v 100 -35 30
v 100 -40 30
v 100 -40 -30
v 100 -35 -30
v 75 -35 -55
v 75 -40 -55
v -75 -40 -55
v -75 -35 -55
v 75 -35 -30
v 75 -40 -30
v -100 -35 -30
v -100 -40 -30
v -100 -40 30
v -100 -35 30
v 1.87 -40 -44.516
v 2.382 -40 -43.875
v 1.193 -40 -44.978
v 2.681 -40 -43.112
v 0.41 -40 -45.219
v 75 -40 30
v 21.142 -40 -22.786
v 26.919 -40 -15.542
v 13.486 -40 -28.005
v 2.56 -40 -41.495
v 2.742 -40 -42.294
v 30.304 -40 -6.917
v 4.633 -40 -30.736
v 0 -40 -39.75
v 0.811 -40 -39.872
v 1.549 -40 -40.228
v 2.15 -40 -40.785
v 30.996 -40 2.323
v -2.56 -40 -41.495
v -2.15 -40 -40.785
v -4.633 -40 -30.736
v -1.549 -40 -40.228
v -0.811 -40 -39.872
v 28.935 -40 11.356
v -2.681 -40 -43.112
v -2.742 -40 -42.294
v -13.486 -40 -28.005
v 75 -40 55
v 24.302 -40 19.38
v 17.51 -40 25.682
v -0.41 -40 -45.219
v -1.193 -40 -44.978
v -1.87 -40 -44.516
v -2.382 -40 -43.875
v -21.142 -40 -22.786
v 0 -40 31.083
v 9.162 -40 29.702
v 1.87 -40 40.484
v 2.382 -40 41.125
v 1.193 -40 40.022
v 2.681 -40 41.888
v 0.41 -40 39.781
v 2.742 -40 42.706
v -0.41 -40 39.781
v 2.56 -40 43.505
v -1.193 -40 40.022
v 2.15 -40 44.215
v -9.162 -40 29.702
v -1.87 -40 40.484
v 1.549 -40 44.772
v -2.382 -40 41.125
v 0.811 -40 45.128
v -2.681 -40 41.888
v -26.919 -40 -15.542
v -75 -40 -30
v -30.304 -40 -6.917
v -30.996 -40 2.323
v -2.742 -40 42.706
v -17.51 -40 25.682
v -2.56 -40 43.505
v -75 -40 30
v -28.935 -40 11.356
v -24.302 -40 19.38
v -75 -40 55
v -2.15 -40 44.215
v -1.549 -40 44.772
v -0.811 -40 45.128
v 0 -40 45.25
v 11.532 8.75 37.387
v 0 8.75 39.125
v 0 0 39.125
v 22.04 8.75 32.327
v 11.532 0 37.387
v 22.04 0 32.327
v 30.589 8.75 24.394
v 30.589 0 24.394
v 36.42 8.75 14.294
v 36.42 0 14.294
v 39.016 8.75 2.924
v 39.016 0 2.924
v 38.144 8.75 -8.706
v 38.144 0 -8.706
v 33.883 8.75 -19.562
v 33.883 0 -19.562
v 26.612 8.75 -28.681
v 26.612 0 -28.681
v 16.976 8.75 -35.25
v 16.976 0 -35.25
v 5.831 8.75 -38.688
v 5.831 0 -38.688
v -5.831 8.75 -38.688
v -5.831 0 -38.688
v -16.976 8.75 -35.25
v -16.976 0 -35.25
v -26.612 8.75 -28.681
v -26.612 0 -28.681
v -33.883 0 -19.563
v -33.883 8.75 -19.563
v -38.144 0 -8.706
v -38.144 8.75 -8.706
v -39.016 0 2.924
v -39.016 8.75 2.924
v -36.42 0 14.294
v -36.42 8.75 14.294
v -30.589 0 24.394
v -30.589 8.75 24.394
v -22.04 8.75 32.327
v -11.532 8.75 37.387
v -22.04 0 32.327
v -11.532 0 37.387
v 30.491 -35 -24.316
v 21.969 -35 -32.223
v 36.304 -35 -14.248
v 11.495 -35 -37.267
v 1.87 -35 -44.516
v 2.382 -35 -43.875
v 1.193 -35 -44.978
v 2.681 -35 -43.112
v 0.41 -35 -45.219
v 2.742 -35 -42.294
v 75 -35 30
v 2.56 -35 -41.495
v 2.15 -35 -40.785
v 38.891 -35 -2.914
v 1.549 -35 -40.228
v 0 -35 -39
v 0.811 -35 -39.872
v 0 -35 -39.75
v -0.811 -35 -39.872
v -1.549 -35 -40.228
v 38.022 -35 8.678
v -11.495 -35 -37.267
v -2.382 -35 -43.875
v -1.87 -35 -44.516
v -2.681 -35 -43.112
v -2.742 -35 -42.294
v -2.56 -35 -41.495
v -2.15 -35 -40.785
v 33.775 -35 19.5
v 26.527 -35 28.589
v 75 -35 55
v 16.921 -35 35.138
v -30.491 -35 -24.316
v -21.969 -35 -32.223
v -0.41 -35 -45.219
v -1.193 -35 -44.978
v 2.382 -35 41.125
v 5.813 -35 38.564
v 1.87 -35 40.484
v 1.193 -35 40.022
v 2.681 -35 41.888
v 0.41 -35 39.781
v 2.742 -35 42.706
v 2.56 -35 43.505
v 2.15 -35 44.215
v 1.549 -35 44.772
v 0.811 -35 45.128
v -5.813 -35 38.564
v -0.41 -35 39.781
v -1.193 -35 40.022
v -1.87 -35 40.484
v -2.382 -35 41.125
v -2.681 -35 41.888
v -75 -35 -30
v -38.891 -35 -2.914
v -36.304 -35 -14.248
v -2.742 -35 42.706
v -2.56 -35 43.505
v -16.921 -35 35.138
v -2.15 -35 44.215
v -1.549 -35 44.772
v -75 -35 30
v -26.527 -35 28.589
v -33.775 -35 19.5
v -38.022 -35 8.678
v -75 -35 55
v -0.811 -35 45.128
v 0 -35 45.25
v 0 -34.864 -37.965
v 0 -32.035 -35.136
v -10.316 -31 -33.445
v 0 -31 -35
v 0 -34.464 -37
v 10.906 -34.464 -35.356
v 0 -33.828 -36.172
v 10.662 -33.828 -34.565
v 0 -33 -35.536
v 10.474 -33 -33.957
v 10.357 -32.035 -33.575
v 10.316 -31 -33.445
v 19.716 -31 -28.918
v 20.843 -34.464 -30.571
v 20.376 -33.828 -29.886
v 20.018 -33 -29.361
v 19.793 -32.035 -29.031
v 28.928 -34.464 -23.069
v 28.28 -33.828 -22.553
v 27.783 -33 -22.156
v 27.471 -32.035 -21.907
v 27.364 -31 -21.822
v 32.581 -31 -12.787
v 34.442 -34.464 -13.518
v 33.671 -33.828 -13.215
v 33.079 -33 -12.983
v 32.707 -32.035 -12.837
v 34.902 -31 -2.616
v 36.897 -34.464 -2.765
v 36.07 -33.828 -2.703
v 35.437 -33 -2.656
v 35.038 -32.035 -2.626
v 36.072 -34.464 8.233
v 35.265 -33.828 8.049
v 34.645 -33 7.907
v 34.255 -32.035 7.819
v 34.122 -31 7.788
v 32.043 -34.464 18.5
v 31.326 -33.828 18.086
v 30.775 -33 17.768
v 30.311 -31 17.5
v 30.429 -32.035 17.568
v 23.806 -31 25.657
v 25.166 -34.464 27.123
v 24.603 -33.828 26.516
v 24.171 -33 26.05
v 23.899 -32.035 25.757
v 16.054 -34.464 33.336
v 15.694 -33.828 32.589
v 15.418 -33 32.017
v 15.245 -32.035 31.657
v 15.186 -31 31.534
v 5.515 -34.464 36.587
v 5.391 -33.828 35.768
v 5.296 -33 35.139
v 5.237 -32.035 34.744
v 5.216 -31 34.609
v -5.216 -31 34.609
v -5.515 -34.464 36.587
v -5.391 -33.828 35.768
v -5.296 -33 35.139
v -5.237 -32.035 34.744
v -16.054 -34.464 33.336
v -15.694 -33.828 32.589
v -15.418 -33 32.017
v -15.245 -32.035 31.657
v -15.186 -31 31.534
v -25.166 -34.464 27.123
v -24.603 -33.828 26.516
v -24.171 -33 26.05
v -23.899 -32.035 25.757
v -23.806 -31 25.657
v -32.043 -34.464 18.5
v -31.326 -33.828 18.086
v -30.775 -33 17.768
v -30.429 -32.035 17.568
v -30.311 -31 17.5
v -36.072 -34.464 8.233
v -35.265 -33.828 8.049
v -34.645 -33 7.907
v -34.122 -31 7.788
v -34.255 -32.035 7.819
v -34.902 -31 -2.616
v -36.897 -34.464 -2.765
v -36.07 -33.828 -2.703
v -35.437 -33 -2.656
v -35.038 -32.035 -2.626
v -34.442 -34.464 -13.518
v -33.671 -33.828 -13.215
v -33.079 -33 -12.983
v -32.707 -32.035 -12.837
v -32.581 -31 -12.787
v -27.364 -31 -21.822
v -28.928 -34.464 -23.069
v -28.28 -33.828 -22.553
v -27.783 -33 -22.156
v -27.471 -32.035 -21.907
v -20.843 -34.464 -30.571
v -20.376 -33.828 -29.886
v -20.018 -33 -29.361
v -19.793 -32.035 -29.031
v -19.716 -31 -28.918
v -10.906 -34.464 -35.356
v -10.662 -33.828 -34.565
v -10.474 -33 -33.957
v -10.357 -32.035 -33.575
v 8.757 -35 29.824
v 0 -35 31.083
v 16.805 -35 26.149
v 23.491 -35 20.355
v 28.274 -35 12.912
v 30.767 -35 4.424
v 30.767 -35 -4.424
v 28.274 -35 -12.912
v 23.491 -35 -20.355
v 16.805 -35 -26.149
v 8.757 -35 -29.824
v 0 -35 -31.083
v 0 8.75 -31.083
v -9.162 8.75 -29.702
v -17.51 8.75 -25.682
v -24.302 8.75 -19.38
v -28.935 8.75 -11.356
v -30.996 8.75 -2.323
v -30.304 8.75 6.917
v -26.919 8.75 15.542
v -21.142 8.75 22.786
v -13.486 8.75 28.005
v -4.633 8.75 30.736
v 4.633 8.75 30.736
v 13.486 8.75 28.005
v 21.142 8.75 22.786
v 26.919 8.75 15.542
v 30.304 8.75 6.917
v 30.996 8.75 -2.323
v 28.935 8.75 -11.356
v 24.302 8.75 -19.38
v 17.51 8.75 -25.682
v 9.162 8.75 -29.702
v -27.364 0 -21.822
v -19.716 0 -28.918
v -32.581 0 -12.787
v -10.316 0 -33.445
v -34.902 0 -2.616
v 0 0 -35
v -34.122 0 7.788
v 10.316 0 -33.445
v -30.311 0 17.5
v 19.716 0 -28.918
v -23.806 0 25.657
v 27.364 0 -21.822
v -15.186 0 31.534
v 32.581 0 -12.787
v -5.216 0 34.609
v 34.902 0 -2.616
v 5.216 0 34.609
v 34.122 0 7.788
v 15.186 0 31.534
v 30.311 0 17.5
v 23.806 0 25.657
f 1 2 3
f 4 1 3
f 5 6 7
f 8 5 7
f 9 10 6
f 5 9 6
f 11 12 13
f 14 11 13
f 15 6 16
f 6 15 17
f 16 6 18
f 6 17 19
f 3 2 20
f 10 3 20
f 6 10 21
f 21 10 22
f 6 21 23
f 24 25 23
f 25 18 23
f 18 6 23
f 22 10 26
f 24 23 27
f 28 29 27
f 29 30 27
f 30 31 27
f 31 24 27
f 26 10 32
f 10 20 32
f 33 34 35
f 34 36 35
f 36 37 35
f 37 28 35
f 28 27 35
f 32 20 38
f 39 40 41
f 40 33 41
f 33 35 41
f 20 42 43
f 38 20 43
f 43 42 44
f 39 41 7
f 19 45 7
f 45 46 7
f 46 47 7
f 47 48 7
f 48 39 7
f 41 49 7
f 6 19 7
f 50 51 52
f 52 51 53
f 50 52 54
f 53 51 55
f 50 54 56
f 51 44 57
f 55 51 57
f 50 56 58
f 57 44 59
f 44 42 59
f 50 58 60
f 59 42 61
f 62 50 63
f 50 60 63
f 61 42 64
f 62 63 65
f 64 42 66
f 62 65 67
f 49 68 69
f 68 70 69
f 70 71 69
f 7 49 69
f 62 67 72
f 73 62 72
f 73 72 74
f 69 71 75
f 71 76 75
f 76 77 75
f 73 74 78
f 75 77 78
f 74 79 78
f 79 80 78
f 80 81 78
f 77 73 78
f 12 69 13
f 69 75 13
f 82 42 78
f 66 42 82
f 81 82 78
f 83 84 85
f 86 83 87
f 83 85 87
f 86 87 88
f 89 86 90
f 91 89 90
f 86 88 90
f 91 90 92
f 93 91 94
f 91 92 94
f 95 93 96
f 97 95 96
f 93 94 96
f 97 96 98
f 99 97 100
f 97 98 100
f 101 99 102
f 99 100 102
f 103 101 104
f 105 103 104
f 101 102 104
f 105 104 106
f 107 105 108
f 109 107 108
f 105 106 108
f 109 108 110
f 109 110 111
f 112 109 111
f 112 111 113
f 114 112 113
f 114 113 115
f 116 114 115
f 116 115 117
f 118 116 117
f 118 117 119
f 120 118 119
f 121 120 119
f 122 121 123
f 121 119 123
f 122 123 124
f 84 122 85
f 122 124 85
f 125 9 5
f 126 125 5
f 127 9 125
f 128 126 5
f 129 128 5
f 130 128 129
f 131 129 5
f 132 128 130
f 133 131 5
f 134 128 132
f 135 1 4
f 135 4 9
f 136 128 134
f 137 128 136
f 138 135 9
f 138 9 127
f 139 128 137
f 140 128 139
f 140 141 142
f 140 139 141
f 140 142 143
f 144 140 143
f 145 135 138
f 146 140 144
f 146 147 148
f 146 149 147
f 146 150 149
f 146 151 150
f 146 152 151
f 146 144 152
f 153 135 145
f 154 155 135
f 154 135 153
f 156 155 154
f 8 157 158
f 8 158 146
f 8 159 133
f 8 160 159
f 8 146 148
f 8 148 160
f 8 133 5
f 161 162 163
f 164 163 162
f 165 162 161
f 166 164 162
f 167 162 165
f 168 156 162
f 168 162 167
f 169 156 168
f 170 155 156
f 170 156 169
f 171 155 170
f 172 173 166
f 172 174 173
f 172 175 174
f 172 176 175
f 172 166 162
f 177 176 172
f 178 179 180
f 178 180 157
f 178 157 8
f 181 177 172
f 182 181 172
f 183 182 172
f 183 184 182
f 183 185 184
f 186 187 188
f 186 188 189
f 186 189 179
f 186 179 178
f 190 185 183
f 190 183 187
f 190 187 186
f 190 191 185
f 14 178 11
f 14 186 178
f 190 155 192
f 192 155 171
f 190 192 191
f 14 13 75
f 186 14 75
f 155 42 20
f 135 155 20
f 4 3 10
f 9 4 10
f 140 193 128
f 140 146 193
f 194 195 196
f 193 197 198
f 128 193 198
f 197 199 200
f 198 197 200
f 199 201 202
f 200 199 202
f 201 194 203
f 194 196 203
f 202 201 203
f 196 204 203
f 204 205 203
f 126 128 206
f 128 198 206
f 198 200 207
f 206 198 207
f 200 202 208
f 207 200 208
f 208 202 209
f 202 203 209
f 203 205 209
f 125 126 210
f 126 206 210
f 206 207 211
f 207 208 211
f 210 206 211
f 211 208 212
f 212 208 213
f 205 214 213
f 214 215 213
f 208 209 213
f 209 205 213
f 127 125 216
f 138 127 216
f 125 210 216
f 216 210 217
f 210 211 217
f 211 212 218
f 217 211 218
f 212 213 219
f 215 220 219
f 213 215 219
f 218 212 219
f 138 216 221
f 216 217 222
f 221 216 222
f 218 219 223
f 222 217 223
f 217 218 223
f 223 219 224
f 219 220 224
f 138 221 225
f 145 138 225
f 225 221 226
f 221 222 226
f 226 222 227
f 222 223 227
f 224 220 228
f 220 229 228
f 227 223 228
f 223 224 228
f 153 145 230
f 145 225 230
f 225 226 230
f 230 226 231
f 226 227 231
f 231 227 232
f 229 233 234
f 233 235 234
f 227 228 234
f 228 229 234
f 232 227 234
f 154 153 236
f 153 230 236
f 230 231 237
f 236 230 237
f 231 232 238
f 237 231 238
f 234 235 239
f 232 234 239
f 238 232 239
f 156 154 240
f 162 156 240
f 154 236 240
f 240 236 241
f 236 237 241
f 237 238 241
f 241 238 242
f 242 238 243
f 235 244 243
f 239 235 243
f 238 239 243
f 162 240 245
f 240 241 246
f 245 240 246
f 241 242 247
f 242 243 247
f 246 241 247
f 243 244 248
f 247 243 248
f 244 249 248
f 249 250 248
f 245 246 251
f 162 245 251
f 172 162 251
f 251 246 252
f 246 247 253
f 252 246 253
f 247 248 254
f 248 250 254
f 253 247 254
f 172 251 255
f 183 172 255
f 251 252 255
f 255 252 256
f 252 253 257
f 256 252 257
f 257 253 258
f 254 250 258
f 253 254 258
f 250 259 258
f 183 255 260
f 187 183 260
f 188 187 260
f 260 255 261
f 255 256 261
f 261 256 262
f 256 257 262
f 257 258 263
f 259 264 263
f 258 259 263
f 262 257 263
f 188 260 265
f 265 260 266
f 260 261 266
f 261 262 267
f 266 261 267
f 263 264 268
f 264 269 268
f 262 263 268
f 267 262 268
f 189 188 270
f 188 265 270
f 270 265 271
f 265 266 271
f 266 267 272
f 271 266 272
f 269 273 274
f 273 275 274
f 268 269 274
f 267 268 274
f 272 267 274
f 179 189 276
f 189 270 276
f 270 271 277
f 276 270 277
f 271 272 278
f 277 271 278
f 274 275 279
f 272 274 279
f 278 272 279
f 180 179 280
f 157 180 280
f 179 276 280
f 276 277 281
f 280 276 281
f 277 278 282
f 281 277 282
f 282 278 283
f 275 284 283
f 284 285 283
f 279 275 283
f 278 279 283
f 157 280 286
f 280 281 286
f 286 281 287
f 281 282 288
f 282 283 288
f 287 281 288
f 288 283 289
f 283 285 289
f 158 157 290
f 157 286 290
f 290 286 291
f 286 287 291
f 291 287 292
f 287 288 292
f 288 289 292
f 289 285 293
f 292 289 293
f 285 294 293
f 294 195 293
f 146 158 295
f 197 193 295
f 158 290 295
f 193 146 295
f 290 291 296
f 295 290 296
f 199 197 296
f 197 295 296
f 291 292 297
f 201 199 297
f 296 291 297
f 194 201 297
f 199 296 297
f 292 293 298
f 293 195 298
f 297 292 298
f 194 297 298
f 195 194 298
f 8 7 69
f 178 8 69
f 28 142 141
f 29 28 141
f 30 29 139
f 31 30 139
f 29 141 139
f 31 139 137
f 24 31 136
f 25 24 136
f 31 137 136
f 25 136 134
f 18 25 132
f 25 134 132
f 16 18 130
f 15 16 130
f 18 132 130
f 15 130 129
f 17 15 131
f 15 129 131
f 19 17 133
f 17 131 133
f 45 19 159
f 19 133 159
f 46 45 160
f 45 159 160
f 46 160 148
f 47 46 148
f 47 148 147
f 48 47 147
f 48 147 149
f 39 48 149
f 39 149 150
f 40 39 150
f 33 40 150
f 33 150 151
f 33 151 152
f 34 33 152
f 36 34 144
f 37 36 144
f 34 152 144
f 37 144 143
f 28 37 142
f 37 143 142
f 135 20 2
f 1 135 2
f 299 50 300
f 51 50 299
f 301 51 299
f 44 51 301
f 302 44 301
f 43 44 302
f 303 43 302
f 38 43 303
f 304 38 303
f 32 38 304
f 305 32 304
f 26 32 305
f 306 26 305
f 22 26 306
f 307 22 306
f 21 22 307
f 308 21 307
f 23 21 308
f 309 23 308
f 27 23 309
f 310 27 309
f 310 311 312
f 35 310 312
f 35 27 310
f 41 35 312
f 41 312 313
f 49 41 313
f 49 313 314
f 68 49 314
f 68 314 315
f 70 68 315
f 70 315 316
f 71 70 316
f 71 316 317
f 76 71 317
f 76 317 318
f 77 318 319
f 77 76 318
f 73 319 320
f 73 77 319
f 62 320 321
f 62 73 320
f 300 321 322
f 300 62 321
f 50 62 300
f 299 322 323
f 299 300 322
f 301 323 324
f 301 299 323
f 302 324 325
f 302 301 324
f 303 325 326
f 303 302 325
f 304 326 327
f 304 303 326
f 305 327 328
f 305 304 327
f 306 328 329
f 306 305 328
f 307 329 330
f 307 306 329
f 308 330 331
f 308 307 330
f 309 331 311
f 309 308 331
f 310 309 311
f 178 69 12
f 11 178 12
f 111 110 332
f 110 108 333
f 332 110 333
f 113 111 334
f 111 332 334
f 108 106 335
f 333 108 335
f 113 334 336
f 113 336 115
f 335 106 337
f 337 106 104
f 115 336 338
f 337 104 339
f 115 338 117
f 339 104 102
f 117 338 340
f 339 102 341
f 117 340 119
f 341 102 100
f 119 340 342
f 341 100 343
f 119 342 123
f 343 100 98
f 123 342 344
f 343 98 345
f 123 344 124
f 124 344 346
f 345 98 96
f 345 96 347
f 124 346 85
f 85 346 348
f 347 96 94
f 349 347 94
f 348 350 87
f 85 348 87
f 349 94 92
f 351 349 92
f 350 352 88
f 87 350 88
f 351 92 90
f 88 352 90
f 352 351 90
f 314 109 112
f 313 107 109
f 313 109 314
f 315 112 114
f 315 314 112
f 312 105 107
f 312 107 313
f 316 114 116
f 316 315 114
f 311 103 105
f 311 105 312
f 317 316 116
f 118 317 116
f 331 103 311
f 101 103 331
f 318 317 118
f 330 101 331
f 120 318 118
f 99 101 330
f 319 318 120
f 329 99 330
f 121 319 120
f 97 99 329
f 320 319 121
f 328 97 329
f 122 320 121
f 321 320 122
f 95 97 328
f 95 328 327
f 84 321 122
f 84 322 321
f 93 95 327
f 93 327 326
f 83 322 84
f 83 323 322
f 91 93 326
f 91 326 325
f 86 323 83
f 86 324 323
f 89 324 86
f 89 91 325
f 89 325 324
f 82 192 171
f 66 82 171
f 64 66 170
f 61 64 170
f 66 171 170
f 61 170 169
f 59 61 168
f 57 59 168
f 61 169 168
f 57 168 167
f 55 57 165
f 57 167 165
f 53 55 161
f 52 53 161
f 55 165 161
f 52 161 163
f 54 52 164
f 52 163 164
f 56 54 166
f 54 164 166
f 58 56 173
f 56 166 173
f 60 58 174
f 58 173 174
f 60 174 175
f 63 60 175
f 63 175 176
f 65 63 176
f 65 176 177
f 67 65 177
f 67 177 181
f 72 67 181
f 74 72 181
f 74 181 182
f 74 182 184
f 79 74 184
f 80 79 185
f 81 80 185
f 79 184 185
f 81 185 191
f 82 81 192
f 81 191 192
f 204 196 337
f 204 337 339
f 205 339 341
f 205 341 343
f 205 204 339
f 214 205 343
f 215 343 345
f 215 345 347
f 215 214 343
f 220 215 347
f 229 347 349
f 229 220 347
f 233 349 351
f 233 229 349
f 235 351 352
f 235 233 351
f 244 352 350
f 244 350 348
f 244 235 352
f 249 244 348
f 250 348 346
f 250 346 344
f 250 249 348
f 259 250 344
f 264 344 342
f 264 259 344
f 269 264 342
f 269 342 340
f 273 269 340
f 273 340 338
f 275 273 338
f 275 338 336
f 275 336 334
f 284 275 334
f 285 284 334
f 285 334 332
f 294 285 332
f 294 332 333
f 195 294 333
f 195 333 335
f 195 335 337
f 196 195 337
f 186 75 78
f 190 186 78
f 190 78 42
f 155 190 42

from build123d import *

# Parameters (mm, degrees)
SKETCH1_R           = 39.125
BOSS_EXTRUDE1_DEPTH = 8.75
SKETCH4_R           = 31.083201595
CUT_EXTRUDE1_DEPTH  = 9
BOSS_EXTRUDE3_START = 40
SKETCH5_R           = 35
SKETCH5_R_2         = 31.083201595
BOSS_EXTRUDE3_DEPTH = 40
SKETCH8_R           = 50
BOSS_EXTRUDE4_DEPTH = 5
SKETCH10_R          = 2.75
CUT_EXTRUDE2_DEPTH  = 5
CUT_EXTRUDE3_START  = -5
SKETCH11_R          = 31.083201595
CUT_EXTRUDE3_DEPTH  = 5
SKETCH12_R          = 2.75
SKETCH12_R_2        = 31.083201595
BOSS_EXTRUDE5_DEPTH = 5
FILLET2_R           = 4


with BuildPart() as part:
    # Sketch1 → Boss-Extrude1 (new body)
    with BuildSketch(Plane(origin=(0, 0, 0), x_dir=(1, 0, 0), z_dir=(0, 1, 0))):
        with Locations(Location((0, 0, 0), (0, 0, 270))):
            Circle(SKETCH1_R)
    extrude(amount=BOSS_EXTRUDE1_DEPTH)

    # Sketch4 → Cut-Extrude1 (cut)
    with BuildSketch(Plane.XZ):
        with Locations(Location((0, 0, 0), (0, 0, 270))):
            Circle(SKETCH4_R)
    extrude(amount=-CUT_EXTRUDE1_DEPTH, mode=Mode.SUBTRACT)

    # Sketch5 → Boss-Extrude3 (add)
    with BuildSketch(Plane.XZ.offset(BOSS_EXTRUDE3_START)):
        with Locations(Location((0, 0, 0), (0, 0, 270))):
            Circle(SKETCH5_R)
        with Locations(Location((0, 0, 0), (0, 0, 270))):
            Circle(SKETCH5_R_2, mode=Mode.SUBTRACT)
    extrude(amount=-BOSS_EXTRUDE3_DEPTH)

    # Sketch8 → Boss-Extrude4 (add)
    with BuildSketch(Plane.XZ.offset(40)):
        with Locations(Location((0, 0, 0), (0, 0, 270))):
            Circle(SKETCH8_R)
    extrude(amount=-BOSS_EXTRUDE4_DEPTH)

    # Sketch10 → Cut-Extrude2 (cut)
    with BuildSketch(Plane(origin=(0, -35, 0), x_dir=(1, 0, 0), z_dir=(0, 1, 0))):
        with Locations(Location((0, 42.5, 0), (0, 0, 270))):
            Circle(SKETCH10_R)
        with Locations(Location((42.5, 0, 0), (0, 0, 270))):
            Circle(SKETCH10_R)
        with Locations(Location((0, -42.5, 0), (0, 0, 270))):
            Circle(SKETCH10_R)
        with Locations(Location((-42.5, 0, 0), (0, 0, 270))):
            Circle(SKETCH10_R)
    extrude(amount=-CUT_EXTRUDE2_DEPTH, mode=Mode.SUBTRACT)

    # Sketch11 → Cut-Extrude3 (cut)
    with BuildSketch(Plane(origin=(0, -35, 0), x_dir=(1, 0, 0), z_dir=(0, 1, 0)).offset(CUT_EXTRUDE3_START)):
        with Locations(Location((0, 0, 0), (0, 0, 270))):
            Circle(SKETCH11_R)
    extrude(amount=CUT_EXTRUDE3_DEPTH, mode=Mode.SUBTRACT)

    # Sketch12 → Boss-Extrude5 (add)
    with BuildSketch(Plane.XZ.offset(40)):
        Polygon((-75, 55), (75, 55), (75, 30), (100, 30), (100, -30), (75, -30), (75, -55), (-75, -55), (-75, -30), (-100, -30), (-100, 30), (-75, 30), align=None)
        with Locations(Location((0, 42.5, 0), (0, 0, 90))):
            Circle(SKETCH12_R, mode=Mode.SUBTRACT)
        with Locations(Location((0, -42.5, 0), (0, 0, 90))):
            Circle(SKETCH12_R, mode=Mode.SUBTRACT)
        with Locations(Location((0, 0, 0), (0, 0, 90))):
            Circle(SKETCH12_R_2, mode=Mode.SUBTRACT)
    extrude(amount=-BOSS_EXTRUDE5_DEPTH)

    # Fillet2
    fillet2_edges = [part.edges().sort_by_distance(p)[0] for p in [
        (0, -35, 35),
    ]]
    fillet(fillet2_edges, radius=FILLET2_R)


solid = part.part
